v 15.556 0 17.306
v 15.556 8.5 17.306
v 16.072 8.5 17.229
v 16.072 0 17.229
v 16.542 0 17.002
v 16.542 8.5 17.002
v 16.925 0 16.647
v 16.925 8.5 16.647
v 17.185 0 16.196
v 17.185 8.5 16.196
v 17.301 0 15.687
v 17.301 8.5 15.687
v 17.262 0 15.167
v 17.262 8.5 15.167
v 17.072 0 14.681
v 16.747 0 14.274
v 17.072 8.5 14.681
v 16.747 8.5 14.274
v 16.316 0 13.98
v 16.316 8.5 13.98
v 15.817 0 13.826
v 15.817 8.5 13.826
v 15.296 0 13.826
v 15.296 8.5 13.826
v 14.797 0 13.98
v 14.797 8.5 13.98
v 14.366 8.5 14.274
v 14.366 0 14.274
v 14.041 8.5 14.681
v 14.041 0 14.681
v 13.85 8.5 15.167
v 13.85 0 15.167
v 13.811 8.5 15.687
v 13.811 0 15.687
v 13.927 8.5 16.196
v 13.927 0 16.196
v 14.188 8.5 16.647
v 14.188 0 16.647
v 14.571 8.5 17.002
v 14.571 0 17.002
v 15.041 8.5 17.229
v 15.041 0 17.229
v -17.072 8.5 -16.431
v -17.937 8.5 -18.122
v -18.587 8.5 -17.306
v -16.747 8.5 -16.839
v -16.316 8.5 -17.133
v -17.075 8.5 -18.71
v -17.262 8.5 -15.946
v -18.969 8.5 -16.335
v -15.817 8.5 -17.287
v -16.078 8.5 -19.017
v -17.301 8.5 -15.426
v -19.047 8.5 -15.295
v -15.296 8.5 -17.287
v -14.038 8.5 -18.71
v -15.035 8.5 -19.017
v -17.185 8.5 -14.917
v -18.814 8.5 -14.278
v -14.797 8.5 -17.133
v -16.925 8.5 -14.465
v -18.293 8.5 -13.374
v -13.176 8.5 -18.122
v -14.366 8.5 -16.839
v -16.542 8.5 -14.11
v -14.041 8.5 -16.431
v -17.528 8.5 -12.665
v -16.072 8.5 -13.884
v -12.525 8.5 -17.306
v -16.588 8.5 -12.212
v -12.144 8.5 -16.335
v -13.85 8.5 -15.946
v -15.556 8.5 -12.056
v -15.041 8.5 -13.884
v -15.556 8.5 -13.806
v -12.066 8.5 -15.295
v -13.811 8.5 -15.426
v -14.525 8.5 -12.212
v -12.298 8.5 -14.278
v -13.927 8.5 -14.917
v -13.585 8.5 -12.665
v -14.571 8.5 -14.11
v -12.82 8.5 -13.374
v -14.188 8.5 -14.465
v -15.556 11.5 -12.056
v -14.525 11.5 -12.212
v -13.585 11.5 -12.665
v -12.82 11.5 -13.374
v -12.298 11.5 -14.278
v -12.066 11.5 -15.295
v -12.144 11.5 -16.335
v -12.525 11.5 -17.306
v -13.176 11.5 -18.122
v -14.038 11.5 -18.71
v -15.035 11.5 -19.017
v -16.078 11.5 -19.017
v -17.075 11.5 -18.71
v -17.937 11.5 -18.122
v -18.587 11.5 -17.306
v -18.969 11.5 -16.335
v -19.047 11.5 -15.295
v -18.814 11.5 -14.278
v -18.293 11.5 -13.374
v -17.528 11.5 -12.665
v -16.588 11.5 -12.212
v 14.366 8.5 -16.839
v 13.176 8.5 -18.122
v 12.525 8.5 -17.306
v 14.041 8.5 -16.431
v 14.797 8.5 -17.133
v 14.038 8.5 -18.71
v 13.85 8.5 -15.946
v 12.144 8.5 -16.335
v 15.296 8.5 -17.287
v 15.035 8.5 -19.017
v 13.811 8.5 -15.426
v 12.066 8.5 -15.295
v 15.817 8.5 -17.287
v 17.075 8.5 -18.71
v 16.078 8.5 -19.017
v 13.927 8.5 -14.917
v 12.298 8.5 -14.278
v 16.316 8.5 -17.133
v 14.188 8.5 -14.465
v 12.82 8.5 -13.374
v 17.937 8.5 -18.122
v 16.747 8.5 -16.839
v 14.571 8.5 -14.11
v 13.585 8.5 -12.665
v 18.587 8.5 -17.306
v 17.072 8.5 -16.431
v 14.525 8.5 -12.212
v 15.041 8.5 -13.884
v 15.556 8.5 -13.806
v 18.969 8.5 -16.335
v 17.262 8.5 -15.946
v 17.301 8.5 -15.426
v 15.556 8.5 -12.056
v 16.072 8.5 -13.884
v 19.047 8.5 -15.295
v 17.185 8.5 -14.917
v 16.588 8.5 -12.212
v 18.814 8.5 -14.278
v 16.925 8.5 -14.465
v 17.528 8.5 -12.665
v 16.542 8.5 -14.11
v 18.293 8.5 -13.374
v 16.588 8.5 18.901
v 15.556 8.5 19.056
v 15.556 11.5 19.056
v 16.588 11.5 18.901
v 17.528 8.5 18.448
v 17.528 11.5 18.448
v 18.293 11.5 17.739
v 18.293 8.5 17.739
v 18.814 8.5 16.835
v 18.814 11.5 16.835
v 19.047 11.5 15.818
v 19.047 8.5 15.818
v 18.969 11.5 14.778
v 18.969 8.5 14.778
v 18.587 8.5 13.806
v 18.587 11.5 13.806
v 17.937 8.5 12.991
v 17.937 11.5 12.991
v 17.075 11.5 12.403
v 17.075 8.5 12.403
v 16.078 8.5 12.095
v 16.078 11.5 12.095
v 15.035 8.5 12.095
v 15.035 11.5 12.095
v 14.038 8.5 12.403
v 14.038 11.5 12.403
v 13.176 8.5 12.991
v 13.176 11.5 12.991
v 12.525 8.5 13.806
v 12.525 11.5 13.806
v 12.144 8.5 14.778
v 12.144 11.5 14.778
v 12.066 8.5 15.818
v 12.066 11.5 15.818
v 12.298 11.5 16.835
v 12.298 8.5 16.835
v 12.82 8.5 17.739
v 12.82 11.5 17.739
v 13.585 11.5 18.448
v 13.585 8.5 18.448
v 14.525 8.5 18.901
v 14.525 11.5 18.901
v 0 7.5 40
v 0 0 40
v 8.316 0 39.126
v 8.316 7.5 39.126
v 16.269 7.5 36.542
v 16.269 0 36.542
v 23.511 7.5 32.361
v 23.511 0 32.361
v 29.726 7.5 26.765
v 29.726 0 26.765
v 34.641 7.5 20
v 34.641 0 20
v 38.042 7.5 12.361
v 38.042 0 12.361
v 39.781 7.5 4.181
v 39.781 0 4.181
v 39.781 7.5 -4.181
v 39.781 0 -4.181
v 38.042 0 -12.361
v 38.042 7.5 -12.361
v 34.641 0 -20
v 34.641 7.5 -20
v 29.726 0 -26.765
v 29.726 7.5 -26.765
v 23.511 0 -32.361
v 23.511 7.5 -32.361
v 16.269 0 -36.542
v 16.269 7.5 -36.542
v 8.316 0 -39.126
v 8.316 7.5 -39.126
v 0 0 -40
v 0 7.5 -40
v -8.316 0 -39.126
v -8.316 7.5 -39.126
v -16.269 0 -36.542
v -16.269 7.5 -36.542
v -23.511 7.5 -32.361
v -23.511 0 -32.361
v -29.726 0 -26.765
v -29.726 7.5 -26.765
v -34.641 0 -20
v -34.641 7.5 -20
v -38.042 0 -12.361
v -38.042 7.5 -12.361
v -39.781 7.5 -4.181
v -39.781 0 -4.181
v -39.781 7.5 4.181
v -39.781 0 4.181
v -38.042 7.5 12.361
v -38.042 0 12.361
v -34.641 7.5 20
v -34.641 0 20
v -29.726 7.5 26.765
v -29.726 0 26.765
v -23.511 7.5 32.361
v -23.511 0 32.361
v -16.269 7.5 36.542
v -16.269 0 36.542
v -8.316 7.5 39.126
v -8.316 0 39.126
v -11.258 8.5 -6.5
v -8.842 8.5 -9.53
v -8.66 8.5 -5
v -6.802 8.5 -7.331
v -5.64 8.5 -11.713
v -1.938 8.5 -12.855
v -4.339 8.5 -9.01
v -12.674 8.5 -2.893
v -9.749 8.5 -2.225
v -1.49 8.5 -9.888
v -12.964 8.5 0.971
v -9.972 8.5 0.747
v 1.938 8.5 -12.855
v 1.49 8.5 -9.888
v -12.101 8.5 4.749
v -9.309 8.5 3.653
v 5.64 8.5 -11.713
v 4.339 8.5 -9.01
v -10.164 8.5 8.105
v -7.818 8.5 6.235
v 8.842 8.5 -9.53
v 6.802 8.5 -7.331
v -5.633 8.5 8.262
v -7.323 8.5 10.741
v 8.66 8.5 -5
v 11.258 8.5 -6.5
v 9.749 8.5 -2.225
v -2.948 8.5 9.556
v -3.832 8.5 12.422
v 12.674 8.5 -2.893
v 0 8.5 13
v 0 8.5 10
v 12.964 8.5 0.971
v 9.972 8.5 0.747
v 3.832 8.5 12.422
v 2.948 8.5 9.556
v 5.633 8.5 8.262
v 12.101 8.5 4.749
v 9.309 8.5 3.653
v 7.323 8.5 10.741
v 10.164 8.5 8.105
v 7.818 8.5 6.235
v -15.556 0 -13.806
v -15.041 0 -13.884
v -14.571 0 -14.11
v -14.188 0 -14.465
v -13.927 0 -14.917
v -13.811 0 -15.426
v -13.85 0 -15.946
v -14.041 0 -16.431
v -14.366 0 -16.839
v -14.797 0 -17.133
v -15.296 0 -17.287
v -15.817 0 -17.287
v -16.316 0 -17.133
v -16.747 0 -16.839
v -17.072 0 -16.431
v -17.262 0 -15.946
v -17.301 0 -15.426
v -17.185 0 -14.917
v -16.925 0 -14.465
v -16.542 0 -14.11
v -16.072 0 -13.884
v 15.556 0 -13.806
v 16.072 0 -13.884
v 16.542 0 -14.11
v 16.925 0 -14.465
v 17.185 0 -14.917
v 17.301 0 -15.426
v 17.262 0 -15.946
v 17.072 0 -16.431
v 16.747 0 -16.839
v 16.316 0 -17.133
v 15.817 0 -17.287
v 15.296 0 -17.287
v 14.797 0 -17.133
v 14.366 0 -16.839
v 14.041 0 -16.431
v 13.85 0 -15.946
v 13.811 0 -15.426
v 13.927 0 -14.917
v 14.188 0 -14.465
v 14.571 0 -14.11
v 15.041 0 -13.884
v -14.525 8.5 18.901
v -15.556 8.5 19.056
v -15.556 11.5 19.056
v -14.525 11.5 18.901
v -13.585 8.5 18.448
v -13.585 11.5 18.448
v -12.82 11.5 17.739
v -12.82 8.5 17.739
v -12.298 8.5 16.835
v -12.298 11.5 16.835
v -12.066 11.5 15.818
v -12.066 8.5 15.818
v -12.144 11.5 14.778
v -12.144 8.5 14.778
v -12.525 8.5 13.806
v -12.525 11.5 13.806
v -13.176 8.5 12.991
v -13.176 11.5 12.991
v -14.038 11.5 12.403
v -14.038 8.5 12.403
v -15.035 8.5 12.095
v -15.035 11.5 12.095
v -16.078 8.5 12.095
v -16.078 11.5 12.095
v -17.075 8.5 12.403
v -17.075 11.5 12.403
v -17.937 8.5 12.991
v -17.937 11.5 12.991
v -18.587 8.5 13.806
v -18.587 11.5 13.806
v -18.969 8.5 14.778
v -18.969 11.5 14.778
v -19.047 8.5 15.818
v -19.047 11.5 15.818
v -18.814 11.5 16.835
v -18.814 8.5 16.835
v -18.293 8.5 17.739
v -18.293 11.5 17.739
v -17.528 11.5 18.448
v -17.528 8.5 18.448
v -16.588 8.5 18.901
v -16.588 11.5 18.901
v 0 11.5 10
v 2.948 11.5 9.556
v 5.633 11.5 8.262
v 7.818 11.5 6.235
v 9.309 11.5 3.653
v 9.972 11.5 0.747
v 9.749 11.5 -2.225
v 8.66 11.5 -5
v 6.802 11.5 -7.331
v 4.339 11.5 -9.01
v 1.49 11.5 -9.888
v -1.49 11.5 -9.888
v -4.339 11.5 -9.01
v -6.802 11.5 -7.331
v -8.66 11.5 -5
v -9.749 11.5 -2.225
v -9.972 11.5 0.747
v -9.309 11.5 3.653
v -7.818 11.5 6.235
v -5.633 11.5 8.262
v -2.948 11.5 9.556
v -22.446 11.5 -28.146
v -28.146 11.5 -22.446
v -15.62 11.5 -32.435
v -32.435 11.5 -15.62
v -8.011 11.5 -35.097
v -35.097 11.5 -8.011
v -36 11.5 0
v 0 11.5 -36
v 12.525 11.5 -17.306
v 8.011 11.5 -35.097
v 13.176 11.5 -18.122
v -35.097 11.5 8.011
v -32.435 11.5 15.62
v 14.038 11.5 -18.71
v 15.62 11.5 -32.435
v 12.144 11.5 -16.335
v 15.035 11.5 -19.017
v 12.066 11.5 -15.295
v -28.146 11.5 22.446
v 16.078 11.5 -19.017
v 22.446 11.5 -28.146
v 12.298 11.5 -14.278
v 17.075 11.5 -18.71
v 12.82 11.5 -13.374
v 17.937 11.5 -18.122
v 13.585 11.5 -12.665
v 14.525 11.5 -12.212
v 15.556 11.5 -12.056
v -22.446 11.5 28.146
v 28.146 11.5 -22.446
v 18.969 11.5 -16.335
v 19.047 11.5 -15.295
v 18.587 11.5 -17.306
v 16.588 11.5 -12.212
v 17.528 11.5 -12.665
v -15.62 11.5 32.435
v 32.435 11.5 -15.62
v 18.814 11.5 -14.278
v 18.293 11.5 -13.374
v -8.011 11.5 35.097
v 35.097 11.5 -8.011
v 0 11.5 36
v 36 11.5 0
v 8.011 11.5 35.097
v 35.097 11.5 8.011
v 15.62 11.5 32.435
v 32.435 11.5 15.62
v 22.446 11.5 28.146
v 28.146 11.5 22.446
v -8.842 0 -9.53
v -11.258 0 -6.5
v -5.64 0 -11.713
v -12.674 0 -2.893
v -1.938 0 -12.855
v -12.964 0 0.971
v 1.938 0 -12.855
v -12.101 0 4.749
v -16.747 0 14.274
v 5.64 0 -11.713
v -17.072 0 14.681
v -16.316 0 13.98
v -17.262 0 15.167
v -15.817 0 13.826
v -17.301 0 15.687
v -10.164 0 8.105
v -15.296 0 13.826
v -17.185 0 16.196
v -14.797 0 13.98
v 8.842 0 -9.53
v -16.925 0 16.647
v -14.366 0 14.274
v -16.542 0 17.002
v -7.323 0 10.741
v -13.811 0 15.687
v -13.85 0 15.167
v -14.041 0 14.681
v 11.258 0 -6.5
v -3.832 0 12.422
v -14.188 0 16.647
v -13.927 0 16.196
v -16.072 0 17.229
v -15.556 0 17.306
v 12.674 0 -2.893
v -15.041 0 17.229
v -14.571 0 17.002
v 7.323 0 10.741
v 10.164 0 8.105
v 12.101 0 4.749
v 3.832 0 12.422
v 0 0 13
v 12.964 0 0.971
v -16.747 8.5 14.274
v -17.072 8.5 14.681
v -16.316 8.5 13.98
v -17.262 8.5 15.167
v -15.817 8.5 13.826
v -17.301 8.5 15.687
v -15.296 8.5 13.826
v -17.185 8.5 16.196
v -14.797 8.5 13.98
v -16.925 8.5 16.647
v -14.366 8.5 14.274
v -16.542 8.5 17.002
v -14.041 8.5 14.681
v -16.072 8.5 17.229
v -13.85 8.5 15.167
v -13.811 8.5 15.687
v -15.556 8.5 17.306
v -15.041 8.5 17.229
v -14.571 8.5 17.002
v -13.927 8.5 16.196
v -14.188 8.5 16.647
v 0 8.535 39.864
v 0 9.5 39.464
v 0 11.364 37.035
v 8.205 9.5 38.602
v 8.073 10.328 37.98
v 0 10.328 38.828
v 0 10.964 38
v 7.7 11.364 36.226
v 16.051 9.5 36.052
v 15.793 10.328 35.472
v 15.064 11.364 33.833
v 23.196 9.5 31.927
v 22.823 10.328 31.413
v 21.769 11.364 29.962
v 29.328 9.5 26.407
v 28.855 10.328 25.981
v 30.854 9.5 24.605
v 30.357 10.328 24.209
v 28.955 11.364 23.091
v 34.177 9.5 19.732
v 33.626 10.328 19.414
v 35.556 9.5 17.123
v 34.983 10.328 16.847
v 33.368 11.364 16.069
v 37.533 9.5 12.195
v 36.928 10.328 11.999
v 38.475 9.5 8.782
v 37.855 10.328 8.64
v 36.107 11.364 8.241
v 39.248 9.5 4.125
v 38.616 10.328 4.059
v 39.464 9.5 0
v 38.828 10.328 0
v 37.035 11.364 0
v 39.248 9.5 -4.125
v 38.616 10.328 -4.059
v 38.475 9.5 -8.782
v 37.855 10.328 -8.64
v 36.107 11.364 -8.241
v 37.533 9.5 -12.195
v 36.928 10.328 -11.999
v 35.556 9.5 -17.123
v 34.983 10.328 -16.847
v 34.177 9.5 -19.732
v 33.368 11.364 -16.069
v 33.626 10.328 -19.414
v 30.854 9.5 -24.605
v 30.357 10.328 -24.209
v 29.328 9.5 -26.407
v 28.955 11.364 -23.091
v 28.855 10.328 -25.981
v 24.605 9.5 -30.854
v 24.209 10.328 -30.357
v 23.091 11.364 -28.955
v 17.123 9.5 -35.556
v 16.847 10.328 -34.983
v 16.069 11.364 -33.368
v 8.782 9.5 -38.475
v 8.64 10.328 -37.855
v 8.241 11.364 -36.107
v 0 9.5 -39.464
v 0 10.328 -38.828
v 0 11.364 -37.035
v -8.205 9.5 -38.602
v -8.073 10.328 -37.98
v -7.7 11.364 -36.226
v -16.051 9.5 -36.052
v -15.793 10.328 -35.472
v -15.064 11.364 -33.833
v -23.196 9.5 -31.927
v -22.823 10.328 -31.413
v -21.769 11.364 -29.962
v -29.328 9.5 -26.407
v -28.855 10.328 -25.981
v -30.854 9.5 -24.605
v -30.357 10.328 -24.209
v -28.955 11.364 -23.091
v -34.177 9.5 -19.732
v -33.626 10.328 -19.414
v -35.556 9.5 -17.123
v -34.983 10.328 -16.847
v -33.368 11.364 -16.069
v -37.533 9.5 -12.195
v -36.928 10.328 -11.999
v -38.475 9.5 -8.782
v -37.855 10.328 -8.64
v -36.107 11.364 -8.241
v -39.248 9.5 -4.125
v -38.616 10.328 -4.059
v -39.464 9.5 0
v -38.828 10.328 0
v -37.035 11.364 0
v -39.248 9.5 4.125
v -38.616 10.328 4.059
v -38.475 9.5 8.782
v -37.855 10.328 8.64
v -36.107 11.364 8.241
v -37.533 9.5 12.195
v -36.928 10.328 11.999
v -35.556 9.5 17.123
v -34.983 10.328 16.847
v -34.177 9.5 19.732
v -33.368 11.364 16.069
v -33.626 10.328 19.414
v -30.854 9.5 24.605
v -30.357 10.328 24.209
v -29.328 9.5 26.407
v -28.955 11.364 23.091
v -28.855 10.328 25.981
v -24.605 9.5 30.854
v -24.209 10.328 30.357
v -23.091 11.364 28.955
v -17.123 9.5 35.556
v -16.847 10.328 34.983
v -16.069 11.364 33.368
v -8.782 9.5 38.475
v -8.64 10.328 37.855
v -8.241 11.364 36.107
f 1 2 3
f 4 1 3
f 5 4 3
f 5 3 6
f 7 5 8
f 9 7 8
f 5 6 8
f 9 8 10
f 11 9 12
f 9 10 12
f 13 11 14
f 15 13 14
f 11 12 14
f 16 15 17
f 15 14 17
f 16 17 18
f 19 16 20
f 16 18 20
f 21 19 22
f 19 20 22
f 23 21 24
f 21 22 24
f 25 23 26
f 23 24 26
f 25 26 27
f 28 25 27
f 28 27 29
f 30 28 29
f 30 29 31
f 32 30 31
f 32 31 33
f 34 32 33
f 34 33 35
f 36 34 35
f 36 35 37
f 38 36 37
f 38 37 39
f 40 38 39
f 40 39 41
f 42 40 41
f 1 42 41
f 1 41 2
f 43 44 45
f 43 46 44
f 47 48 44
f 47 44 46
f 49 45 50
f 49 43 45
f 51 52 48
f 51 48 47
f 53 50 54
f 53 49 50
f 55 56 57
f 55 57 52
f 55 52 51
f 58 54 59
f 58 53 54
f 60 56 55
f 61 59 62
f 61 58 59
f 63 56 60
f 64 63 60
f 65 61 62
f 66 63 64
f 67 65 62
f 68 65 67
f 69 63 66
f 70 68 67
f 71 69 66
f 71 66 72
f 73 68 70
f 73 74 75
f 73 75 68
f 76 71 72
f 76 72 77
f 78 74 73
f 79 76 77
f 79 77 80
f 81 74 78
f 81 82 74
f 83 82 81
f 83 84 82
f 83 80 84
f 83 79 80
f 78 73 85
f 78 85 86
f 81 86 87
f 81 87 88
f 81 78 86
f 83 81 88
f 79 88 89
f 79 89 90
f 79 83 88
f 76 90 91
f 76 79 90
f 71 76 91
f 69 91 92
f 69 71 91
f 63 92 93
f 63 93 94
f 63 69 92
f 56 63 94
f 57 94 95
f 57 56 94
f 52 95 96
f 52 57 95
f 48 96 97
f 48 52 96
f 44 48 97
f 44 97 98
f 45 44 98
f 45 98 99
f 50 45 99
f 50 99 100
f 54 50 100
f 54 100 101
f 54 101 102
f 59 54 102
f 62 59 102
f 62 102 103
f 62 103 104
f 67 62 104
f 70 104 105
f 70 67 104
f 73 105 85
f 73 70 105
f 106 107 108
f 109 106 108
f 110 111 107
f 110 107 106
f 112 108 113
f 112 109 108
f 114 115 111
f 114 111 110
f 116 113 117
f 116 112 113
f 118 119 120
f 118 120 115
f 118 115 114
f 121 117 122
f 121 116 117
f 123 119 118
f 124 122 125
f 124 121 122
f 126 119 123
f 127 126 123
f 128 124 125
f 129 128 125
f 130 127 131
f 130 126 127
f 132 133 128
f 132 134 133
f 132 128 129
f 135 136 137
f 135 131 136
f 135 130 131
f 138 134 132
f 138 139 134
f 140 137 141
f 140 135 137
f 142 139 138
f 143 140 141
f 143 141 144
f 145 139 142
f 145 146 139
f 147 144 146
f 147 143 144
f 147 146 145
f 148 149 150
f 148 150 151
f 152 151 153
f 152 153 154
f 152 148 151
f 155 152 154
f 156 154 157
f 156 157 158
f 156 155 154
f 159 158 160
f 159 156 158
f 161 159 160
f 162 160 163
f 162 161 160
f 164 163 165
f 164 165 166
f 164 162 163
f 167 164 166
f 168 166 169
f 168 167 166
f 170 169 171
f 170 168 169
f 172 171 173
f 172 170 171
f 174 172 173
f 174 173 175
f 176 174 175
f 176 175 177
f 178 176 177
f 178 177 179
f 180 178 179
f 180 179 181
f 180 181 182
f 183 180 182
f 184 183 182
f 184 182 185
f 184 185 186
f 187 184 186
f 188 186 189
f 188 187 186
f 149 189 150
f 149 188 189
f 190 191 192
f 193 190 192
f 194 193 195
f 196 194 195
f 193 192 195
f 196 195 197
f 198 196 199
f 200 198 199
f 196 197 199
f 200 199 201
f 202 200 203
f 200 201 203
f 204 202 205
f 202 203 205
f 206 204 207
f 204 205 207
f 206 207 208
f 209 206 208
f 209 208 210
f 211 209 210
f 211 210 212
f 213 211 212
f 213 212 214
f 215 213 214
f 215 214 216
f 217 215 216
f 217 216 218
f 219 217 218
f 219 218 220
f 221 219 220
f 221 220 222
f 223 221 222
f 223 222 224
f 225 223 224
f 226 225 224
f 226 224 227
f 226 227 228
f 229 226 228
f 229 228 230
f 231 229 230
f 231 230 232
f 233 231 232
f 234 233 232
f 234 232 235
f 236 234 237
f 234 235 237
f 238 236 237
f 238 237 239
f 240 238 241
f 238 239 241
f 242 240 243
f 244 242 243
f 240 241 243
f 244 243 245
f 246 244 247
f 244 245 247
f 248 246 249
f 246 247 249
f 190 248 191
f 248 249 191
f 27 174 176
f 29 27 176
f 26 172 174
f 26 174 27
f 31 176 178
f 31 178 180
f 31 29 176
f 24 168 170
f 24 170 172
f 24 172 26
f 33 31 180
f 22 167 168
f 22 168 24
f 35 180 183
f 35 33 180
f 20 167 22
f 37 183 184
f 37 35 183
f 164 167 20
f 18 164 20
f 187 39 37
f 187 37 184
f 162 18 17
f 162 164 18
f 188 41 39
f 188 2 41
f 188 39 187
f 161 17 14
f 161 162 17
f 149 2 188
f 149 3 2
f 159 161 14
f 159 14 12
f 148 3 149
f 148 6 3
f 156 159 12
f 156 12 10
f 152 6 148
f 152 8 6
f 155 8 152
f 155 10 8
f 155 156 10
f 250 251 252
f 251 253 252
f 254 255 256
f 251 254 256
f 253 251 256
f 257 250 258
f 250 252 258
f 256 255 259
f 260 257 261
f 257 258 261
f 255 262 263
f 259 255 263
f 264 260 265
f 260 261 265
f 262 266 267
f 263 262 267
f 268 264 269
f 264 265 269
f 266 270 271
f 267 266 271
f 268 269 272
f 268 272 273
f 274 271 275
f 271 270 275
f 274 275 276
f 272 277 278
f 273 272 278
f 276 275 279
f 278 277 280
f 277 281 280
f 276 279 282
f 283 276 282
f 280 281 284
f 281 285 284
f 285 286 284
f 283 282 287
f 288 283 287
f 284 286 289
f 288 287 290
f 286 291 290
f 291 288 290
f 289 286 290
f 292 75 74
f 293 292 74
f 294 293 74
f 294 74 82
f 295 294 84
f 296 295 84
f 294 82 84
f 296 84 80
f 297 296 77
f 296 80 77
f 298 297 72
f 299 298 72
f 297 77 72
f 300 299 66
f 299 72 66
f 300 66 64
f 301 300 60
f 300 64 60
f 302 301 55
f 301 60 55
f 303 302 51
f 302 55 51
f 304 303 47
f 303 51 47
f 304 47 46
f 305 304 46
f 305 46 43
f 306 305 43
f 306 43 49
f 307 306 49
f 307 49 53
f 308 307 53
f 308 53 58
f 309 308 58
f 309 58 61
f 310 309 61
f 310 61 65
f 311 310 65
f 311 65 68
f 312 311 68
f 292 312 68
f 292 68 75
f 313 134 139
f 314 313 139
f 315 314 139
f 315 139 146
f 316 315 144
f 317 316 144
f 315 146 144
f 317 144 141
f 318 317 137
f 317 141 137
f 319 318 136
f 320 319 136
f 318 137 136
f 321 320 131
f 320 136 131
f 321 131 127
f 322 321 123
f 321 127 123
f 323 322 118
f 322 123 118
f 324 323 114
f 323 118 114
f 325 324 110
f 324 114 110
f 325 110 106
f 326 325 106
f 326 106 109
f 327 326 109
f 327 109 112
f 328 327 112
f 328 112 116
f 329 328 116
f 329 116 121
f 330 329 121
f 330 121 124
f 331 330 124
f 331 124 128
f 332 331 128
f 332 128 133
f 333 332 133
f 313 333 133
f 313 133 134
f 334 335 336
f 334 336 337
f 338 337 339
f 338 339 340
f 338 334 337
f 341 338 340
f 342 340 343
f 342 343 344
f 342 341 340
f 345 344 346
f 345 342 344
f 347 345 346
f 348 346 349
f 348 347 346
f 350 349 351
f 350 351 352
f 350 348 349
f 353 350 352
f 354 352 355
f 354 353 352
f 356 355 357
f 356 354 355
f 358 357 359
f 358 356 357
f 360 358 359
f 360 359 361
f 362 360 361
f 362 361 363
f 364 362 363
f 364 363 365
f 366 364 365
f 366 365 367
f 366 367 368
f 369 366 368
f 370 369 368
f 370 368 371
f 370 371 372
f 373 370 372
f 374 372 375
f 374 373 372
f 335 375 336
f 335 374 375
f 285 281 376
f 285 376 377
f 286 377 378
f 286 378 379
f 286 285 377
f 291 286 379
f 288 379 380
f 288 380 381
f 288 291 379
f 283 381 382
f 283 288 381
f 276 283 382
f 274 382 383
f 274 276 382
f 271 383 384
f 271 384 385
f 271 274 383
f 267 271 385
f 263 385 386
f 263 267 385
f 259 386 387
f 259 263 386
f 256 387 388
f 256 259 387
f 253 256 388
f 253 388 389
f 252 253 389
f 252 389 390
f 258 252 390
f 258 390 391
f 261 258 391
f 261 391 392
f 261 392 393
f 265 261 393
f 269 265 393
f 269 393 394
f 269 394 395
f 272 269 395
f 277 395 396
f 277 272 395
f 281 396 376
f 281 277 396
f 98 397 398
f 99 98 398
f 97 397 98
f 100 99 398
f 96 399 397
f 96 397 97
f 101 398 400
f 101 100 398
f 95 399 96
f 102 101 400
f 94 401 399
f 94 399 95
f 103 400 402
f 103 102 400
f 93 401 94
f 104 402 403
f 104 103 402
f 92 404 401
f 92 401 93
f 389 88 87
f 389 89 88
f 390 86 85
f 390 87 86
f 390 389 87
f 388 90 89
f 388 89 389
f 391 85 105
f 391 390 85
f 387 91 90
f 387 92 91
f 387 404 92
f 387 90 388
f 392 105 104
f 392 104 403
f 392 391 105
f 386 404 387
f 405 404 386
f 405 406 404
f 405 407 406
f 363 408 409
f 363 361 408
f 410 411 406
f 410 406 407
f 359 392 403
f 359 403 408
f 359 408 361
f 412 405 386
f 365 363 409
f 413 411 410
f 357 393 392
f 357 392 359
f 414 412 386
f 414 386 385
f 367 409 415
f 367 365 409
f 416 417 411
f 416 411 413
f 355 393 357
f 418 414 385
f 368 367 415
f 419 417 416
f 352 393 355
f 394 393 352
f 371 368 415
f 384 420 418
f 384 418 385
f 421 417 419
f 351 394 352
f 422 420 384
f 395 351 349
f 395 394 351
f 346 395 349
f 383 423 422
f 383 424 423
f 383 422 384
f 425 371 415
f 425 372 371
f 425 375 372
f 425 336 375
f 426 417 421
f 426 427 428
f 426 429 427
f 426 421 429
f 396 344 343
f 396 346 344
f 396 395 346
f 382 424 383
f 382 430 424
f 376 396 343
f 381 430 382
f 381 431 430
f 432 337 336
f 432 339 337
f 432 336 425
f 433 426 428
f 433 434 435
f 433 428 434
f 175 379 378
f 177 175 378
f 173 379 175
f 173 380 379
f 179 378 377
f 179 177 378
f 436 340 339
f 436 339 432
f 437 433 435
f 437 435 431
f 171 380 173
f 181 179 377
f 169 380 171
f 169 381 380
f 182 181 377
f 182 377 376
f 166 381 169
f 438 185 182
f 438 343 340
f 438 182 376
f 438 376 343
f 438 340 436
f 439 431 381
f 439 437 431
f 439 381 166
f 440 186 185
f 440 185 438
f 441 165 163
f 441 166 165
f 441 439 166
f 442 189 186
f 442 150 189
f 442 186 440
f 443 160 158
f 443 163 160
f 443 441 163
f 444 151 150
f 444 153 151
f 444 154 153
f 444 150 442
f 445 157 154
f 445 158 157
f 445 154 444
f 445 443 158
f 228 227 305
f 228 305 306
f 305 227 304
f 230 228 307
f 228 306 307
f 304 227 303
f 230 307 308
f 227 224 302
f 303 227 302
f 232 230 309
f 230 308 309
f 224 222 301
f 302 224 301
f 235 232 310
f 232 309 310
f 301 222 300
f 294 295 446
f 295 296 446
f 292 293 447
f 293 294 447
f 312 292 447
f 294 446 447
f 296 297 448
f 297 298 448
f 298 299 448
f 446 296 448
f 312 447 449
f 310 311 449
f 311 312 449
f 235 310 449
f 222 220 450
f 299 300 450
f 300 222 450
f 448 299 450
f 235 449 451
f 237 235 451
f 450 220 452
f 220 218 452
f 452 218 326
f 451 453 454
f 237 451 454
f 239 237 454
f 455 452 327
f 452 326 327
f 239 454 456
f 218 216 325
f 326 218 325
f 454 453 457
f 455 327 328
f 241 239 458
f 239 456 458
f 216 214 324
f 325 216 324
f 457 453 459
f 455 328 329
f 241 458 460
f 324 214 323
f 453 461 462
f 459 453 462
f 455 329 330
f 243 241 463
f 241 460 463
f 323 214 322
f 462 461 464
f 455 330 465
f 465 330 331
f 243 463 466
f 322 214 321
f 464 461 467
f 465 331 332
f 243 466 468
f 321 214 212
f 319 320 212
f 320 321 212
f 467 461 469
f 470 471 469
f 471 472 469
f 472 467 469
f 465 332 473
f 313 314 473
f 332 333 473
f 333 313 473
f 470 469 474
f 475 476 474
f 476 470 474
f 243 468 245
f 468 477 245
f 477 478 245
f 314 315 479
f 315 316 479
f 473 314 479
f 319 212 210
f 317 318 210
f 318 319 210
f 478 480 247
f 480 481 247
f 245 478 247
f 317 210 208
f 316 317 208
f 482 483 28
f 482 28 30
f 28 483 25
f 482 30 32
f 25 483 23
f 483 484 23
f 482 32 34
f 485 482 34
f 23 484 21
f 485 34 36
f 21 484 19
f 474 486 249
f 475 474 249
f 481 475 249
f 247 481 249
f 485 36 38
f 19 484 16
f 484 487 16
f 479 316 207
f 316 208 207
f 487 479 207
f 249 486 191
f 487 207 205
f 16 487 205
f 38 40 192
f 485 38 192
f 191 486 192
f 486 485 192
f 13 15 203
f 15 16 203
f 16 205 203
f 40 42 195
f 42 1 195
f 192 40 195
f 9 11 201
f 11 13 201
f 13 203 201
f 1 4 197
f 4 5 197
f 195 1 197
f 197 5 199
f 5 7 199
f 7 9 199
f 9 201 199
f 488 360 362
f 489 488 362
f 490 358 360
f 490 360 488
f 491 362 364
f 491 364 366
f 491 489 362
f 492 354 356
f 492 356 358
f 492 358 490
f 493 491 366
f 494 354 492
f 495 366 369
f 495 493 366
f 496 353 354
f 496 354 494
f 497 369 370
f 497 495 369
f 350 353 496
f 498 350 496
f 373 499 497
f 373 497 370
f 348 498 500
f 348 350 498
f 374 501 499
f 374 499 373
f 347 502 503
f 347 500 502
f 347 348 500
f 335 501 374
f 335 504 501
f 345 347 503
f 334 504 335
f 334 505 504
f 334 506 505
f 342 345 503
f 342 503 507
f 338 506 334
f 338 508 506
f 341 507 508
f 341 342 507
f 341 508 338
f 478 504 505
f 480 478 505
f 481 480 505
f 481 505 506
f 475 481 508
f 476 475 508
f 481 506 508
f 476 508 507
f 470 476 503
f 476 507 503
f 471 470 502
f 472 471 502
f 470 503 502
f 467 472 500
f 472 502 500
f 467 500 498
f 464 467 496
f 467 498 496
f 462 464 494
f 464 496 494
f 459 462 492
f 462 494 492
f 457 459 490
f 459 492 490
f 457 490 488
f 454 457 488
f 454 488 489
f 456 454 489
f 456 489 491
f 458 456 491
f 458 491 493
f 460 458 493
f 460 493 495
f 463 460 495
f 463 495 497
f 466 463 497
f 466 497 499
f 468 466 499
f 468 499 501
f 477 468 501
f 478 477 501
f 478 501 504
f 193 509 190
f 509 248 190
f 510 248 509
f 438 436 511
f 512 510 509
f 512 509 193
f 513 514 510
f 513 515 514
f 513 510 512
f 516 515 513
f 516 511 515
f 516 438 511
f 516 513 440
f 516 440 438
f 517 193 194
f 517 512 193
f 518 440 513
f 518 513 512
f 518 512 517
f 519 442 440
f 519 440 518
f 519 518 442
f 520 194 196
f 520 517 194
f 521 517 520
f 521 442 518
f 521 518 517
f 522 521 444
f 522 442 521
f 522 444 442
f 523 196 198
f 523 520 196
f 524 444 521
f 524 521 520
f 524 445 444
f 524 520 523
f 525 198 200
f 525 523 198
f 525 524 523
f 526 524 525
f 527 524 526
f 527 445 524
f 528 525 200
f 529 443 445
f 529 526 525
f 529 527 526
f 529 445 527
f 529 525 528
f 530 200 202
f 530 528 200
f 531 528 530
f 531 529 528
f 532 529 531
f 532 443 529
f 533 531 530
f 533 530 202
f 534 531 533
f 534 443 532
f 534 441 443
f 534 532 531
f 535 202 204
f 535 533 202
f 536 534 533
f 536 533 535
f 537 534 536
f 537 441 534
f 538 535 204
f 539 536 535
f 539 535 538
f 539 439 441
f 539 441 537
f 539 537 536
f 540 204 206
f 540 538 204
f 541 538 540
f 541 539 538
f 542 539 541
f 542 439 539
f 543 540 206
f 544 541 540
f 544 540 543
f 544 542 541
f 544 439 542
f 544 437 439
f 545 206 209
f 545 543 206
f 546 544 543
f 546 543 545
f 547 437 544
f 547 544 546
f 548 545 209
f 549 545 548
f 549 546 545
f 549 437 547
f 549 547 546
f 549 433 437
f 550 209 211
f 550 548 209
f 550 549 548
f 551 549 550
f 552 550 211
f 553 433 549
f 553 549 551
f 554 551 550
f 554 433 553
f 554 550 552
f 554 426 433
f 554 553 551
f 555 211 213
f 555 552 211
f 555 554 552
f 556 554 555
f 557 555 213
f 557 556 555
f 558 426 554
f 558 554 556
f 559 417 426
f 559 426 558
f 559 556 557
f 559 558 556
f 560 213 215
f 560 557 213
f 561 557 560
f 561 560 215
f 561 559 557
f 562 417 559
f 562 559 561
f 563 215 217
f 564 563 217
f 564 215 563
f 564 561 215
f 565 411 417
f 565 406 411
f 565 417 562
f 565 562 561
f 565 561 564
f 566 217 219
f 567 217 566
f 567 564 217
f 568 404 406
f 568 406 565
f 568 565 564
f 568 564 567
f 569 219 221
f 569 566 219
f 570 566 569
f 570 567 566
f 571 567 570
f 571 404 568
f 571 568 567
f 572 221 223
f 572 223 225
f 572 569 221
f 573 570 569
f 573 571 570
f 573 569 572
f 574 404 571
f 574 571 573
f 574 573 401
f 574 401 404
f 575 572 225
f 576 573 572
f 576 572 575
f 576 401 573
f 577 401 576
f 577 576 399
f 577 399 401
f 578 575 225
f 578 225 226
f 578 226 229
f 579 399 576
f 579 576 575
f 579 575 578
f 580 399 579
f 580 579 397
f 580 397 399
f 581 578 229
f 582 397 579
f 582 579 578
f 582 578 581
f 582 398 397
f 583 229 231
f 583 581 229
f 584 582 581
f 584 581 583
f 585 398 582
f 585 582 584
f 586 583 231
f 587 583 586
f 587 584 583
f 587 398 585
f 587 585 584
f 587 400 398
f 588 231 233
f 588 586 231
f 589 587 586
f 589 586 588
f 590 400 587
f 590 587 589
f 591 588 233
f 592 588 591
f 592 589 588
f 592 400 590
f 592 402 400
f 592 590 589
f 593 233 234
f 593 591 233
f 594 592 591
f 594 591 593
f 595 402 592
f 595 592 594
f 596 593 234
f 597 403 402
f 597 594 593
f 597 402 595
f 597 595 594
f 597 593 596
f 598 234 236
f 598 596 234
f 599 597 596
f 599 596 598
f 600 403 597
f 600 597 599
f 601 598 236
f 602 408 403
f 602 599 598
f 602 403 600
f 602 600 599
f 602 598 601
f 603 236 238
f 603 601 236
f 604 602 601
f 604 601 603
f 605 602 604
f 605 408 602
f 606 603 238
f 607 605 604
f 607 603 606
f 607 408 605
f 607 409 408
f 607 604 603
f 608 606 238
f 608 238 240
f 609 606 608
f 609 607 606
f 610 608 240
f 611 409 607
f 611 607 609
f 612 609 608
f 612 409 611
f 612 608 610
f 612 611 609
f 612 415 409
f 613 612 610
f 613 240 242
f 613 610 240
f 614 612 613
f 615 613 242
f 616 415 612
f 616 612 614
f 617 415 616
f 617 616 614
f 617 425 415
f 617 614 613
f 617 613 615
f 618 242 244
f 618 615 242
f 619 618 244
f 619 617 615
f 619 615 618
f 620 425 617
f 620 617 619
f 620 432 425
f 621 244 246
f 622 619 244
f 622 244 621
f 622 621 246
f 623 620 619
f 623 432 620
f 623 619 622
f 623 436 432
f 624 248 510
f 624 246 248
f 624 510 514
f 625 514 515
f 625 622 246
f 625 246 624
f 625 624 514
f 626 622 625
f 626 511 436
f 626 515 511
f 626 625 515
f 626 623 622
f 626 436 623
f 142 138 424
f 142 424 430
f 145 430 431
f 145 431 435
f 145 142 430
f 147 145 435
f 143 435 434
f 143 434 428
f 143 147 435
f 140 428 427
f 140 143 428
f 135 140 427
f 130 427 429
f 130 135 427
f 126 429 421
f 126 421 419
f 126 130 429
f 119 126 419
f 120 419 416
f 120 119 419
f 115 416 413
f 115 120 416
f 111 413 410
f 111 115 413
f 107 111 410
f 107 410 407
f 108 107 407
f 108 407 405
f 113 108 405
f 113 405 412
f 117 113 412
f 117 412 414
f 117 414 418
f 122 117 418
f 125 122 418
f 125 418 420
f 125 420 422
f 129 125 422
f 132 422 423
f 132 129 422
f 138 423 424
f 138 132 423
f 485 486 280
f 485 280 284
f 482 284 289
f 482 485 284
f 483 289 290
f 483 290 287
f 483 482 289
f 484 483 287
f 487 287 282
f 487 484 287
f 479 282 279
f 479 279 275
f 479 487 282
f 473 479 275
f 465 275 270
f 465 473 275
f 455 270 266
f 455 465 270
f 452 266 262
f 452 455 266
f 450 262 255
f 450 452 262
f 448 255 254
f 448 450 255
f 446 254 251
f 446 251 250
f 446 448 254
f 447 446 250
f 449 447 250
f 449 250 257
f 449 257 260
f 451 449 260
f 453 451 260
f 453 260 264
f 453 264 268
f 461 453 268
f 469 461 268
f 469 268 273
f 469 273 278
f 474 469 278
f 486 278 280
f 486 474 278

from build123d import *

# Parameters (mm, degrees)
SKETCH1_R           = 40
SKETCH1_R_2         = 13
BOSS_EXTRUDE1_DEPTH = 8.5
SKETCH3_R           = 1.75
CUT_EXTRUDE1_DEPTH  = 58.203583804
SKETCH2_R           = 40
SKETCH2_R_2         = 10
SKETCH2_R_3         = 3.5
BOSS_EXTRUDE2_DEPTH = 3
FILLET1_R           = 4


with BuildPart() as part:
    # Sketch1 → Boss-Extrude1 (new body)
    with BuildSketch(Plane(origin=(0, 0, 0), x_dir=(1, 0, 0), z_dir=(0, 1, 0))):
        with Locations(Location((0, 0, 0), (0, 0, 270))):
            Circle(SKETCH1_R)
        with Locations(Location((0, 0, 0), (0, 0, 270))):
            Circle(SKETCH1_R_2, mode=Mode.SUBTRACT)
    extrude(amount=BOSS_EXTRUDE1_DEPTH)

    # Sketch3 → Cut-Extrude1 (cut, through all)
    with BuildSketch(Plane(origin=(0, 8.5, 0), x_dir=(1, 0, 0), z_dir=(0, 1, 0))):
        with Locations(Location((-15.556349186, 15.556349186, 0), (0, 0, 270))):
            Circle(SKETCH3_R)
        with Locations(Location((15.556349186, 15.556349186, 0), (0, 0, 270))):
            Circle(SKETCH3_R)
        with Locations(Location((15.556349186, -15.556349186, 0), (0, 0, 270))):
            Circle(SKETCH3_R)
        with Locations(Location((-15.556349186, -15.556349186, 0), (0, 0, 270))):
            Circle(SKETCH3_R)
    extrude(amount=-CUT_EXTRUDE1_DEPTH, mode=Mode.SUBTRACT)

    # Sketch2 → Boss-Extrude2 (add)
    with BuildSketch(Plane(origin=(0, 8.5, 0), x_dir=(1, 0, 0), z_dir=(0, 1, 0))):
        with Locations(Location((0, 0, 0), (0, 0, 270))):
            Circle(SKETCH2_R)
        with Locations(Location((0, 0, 0), (0, 0, 270))):
            Circle(SKETCH2_R_2, mode=Mode.SUBTRACT)
        with Locations(Location((-15.556349186, 15.556349186, 0), (0, 0, 270))):
            Circle(SKETCH2_R_3, mode=Mode.SUBTRACT)
        with Locations(Location((15.556349186, 15.556349186, 0), (0, 0, 270))):
            Circle(SKETCH2_R_3, mode=Mode.SUBTRACT)
        with Locations(Location((15.556349186, -15.556349186, 0), (0, 0, 270))):
            Circle(SKETCH2_R_3, mode=Mode.SUBTRACT)
        with Locations(Location((-15.556349186, -15.556349186, 0), (0, 0, 270))):
            Circle(SKETCH2_R_3, mode=Mode.SUBTRACT)
    extrude(amount=BOSS_EXTRUDE2_DEPTH)

    # Fillet1
    fillet1_edges = [part.edges().sort_by_distance(p)[0] for p in [
        (0, 11.5, -40),
    ]]
    fillet(fillet1_edges, radius=FILLET1_R)


solid = part.part
